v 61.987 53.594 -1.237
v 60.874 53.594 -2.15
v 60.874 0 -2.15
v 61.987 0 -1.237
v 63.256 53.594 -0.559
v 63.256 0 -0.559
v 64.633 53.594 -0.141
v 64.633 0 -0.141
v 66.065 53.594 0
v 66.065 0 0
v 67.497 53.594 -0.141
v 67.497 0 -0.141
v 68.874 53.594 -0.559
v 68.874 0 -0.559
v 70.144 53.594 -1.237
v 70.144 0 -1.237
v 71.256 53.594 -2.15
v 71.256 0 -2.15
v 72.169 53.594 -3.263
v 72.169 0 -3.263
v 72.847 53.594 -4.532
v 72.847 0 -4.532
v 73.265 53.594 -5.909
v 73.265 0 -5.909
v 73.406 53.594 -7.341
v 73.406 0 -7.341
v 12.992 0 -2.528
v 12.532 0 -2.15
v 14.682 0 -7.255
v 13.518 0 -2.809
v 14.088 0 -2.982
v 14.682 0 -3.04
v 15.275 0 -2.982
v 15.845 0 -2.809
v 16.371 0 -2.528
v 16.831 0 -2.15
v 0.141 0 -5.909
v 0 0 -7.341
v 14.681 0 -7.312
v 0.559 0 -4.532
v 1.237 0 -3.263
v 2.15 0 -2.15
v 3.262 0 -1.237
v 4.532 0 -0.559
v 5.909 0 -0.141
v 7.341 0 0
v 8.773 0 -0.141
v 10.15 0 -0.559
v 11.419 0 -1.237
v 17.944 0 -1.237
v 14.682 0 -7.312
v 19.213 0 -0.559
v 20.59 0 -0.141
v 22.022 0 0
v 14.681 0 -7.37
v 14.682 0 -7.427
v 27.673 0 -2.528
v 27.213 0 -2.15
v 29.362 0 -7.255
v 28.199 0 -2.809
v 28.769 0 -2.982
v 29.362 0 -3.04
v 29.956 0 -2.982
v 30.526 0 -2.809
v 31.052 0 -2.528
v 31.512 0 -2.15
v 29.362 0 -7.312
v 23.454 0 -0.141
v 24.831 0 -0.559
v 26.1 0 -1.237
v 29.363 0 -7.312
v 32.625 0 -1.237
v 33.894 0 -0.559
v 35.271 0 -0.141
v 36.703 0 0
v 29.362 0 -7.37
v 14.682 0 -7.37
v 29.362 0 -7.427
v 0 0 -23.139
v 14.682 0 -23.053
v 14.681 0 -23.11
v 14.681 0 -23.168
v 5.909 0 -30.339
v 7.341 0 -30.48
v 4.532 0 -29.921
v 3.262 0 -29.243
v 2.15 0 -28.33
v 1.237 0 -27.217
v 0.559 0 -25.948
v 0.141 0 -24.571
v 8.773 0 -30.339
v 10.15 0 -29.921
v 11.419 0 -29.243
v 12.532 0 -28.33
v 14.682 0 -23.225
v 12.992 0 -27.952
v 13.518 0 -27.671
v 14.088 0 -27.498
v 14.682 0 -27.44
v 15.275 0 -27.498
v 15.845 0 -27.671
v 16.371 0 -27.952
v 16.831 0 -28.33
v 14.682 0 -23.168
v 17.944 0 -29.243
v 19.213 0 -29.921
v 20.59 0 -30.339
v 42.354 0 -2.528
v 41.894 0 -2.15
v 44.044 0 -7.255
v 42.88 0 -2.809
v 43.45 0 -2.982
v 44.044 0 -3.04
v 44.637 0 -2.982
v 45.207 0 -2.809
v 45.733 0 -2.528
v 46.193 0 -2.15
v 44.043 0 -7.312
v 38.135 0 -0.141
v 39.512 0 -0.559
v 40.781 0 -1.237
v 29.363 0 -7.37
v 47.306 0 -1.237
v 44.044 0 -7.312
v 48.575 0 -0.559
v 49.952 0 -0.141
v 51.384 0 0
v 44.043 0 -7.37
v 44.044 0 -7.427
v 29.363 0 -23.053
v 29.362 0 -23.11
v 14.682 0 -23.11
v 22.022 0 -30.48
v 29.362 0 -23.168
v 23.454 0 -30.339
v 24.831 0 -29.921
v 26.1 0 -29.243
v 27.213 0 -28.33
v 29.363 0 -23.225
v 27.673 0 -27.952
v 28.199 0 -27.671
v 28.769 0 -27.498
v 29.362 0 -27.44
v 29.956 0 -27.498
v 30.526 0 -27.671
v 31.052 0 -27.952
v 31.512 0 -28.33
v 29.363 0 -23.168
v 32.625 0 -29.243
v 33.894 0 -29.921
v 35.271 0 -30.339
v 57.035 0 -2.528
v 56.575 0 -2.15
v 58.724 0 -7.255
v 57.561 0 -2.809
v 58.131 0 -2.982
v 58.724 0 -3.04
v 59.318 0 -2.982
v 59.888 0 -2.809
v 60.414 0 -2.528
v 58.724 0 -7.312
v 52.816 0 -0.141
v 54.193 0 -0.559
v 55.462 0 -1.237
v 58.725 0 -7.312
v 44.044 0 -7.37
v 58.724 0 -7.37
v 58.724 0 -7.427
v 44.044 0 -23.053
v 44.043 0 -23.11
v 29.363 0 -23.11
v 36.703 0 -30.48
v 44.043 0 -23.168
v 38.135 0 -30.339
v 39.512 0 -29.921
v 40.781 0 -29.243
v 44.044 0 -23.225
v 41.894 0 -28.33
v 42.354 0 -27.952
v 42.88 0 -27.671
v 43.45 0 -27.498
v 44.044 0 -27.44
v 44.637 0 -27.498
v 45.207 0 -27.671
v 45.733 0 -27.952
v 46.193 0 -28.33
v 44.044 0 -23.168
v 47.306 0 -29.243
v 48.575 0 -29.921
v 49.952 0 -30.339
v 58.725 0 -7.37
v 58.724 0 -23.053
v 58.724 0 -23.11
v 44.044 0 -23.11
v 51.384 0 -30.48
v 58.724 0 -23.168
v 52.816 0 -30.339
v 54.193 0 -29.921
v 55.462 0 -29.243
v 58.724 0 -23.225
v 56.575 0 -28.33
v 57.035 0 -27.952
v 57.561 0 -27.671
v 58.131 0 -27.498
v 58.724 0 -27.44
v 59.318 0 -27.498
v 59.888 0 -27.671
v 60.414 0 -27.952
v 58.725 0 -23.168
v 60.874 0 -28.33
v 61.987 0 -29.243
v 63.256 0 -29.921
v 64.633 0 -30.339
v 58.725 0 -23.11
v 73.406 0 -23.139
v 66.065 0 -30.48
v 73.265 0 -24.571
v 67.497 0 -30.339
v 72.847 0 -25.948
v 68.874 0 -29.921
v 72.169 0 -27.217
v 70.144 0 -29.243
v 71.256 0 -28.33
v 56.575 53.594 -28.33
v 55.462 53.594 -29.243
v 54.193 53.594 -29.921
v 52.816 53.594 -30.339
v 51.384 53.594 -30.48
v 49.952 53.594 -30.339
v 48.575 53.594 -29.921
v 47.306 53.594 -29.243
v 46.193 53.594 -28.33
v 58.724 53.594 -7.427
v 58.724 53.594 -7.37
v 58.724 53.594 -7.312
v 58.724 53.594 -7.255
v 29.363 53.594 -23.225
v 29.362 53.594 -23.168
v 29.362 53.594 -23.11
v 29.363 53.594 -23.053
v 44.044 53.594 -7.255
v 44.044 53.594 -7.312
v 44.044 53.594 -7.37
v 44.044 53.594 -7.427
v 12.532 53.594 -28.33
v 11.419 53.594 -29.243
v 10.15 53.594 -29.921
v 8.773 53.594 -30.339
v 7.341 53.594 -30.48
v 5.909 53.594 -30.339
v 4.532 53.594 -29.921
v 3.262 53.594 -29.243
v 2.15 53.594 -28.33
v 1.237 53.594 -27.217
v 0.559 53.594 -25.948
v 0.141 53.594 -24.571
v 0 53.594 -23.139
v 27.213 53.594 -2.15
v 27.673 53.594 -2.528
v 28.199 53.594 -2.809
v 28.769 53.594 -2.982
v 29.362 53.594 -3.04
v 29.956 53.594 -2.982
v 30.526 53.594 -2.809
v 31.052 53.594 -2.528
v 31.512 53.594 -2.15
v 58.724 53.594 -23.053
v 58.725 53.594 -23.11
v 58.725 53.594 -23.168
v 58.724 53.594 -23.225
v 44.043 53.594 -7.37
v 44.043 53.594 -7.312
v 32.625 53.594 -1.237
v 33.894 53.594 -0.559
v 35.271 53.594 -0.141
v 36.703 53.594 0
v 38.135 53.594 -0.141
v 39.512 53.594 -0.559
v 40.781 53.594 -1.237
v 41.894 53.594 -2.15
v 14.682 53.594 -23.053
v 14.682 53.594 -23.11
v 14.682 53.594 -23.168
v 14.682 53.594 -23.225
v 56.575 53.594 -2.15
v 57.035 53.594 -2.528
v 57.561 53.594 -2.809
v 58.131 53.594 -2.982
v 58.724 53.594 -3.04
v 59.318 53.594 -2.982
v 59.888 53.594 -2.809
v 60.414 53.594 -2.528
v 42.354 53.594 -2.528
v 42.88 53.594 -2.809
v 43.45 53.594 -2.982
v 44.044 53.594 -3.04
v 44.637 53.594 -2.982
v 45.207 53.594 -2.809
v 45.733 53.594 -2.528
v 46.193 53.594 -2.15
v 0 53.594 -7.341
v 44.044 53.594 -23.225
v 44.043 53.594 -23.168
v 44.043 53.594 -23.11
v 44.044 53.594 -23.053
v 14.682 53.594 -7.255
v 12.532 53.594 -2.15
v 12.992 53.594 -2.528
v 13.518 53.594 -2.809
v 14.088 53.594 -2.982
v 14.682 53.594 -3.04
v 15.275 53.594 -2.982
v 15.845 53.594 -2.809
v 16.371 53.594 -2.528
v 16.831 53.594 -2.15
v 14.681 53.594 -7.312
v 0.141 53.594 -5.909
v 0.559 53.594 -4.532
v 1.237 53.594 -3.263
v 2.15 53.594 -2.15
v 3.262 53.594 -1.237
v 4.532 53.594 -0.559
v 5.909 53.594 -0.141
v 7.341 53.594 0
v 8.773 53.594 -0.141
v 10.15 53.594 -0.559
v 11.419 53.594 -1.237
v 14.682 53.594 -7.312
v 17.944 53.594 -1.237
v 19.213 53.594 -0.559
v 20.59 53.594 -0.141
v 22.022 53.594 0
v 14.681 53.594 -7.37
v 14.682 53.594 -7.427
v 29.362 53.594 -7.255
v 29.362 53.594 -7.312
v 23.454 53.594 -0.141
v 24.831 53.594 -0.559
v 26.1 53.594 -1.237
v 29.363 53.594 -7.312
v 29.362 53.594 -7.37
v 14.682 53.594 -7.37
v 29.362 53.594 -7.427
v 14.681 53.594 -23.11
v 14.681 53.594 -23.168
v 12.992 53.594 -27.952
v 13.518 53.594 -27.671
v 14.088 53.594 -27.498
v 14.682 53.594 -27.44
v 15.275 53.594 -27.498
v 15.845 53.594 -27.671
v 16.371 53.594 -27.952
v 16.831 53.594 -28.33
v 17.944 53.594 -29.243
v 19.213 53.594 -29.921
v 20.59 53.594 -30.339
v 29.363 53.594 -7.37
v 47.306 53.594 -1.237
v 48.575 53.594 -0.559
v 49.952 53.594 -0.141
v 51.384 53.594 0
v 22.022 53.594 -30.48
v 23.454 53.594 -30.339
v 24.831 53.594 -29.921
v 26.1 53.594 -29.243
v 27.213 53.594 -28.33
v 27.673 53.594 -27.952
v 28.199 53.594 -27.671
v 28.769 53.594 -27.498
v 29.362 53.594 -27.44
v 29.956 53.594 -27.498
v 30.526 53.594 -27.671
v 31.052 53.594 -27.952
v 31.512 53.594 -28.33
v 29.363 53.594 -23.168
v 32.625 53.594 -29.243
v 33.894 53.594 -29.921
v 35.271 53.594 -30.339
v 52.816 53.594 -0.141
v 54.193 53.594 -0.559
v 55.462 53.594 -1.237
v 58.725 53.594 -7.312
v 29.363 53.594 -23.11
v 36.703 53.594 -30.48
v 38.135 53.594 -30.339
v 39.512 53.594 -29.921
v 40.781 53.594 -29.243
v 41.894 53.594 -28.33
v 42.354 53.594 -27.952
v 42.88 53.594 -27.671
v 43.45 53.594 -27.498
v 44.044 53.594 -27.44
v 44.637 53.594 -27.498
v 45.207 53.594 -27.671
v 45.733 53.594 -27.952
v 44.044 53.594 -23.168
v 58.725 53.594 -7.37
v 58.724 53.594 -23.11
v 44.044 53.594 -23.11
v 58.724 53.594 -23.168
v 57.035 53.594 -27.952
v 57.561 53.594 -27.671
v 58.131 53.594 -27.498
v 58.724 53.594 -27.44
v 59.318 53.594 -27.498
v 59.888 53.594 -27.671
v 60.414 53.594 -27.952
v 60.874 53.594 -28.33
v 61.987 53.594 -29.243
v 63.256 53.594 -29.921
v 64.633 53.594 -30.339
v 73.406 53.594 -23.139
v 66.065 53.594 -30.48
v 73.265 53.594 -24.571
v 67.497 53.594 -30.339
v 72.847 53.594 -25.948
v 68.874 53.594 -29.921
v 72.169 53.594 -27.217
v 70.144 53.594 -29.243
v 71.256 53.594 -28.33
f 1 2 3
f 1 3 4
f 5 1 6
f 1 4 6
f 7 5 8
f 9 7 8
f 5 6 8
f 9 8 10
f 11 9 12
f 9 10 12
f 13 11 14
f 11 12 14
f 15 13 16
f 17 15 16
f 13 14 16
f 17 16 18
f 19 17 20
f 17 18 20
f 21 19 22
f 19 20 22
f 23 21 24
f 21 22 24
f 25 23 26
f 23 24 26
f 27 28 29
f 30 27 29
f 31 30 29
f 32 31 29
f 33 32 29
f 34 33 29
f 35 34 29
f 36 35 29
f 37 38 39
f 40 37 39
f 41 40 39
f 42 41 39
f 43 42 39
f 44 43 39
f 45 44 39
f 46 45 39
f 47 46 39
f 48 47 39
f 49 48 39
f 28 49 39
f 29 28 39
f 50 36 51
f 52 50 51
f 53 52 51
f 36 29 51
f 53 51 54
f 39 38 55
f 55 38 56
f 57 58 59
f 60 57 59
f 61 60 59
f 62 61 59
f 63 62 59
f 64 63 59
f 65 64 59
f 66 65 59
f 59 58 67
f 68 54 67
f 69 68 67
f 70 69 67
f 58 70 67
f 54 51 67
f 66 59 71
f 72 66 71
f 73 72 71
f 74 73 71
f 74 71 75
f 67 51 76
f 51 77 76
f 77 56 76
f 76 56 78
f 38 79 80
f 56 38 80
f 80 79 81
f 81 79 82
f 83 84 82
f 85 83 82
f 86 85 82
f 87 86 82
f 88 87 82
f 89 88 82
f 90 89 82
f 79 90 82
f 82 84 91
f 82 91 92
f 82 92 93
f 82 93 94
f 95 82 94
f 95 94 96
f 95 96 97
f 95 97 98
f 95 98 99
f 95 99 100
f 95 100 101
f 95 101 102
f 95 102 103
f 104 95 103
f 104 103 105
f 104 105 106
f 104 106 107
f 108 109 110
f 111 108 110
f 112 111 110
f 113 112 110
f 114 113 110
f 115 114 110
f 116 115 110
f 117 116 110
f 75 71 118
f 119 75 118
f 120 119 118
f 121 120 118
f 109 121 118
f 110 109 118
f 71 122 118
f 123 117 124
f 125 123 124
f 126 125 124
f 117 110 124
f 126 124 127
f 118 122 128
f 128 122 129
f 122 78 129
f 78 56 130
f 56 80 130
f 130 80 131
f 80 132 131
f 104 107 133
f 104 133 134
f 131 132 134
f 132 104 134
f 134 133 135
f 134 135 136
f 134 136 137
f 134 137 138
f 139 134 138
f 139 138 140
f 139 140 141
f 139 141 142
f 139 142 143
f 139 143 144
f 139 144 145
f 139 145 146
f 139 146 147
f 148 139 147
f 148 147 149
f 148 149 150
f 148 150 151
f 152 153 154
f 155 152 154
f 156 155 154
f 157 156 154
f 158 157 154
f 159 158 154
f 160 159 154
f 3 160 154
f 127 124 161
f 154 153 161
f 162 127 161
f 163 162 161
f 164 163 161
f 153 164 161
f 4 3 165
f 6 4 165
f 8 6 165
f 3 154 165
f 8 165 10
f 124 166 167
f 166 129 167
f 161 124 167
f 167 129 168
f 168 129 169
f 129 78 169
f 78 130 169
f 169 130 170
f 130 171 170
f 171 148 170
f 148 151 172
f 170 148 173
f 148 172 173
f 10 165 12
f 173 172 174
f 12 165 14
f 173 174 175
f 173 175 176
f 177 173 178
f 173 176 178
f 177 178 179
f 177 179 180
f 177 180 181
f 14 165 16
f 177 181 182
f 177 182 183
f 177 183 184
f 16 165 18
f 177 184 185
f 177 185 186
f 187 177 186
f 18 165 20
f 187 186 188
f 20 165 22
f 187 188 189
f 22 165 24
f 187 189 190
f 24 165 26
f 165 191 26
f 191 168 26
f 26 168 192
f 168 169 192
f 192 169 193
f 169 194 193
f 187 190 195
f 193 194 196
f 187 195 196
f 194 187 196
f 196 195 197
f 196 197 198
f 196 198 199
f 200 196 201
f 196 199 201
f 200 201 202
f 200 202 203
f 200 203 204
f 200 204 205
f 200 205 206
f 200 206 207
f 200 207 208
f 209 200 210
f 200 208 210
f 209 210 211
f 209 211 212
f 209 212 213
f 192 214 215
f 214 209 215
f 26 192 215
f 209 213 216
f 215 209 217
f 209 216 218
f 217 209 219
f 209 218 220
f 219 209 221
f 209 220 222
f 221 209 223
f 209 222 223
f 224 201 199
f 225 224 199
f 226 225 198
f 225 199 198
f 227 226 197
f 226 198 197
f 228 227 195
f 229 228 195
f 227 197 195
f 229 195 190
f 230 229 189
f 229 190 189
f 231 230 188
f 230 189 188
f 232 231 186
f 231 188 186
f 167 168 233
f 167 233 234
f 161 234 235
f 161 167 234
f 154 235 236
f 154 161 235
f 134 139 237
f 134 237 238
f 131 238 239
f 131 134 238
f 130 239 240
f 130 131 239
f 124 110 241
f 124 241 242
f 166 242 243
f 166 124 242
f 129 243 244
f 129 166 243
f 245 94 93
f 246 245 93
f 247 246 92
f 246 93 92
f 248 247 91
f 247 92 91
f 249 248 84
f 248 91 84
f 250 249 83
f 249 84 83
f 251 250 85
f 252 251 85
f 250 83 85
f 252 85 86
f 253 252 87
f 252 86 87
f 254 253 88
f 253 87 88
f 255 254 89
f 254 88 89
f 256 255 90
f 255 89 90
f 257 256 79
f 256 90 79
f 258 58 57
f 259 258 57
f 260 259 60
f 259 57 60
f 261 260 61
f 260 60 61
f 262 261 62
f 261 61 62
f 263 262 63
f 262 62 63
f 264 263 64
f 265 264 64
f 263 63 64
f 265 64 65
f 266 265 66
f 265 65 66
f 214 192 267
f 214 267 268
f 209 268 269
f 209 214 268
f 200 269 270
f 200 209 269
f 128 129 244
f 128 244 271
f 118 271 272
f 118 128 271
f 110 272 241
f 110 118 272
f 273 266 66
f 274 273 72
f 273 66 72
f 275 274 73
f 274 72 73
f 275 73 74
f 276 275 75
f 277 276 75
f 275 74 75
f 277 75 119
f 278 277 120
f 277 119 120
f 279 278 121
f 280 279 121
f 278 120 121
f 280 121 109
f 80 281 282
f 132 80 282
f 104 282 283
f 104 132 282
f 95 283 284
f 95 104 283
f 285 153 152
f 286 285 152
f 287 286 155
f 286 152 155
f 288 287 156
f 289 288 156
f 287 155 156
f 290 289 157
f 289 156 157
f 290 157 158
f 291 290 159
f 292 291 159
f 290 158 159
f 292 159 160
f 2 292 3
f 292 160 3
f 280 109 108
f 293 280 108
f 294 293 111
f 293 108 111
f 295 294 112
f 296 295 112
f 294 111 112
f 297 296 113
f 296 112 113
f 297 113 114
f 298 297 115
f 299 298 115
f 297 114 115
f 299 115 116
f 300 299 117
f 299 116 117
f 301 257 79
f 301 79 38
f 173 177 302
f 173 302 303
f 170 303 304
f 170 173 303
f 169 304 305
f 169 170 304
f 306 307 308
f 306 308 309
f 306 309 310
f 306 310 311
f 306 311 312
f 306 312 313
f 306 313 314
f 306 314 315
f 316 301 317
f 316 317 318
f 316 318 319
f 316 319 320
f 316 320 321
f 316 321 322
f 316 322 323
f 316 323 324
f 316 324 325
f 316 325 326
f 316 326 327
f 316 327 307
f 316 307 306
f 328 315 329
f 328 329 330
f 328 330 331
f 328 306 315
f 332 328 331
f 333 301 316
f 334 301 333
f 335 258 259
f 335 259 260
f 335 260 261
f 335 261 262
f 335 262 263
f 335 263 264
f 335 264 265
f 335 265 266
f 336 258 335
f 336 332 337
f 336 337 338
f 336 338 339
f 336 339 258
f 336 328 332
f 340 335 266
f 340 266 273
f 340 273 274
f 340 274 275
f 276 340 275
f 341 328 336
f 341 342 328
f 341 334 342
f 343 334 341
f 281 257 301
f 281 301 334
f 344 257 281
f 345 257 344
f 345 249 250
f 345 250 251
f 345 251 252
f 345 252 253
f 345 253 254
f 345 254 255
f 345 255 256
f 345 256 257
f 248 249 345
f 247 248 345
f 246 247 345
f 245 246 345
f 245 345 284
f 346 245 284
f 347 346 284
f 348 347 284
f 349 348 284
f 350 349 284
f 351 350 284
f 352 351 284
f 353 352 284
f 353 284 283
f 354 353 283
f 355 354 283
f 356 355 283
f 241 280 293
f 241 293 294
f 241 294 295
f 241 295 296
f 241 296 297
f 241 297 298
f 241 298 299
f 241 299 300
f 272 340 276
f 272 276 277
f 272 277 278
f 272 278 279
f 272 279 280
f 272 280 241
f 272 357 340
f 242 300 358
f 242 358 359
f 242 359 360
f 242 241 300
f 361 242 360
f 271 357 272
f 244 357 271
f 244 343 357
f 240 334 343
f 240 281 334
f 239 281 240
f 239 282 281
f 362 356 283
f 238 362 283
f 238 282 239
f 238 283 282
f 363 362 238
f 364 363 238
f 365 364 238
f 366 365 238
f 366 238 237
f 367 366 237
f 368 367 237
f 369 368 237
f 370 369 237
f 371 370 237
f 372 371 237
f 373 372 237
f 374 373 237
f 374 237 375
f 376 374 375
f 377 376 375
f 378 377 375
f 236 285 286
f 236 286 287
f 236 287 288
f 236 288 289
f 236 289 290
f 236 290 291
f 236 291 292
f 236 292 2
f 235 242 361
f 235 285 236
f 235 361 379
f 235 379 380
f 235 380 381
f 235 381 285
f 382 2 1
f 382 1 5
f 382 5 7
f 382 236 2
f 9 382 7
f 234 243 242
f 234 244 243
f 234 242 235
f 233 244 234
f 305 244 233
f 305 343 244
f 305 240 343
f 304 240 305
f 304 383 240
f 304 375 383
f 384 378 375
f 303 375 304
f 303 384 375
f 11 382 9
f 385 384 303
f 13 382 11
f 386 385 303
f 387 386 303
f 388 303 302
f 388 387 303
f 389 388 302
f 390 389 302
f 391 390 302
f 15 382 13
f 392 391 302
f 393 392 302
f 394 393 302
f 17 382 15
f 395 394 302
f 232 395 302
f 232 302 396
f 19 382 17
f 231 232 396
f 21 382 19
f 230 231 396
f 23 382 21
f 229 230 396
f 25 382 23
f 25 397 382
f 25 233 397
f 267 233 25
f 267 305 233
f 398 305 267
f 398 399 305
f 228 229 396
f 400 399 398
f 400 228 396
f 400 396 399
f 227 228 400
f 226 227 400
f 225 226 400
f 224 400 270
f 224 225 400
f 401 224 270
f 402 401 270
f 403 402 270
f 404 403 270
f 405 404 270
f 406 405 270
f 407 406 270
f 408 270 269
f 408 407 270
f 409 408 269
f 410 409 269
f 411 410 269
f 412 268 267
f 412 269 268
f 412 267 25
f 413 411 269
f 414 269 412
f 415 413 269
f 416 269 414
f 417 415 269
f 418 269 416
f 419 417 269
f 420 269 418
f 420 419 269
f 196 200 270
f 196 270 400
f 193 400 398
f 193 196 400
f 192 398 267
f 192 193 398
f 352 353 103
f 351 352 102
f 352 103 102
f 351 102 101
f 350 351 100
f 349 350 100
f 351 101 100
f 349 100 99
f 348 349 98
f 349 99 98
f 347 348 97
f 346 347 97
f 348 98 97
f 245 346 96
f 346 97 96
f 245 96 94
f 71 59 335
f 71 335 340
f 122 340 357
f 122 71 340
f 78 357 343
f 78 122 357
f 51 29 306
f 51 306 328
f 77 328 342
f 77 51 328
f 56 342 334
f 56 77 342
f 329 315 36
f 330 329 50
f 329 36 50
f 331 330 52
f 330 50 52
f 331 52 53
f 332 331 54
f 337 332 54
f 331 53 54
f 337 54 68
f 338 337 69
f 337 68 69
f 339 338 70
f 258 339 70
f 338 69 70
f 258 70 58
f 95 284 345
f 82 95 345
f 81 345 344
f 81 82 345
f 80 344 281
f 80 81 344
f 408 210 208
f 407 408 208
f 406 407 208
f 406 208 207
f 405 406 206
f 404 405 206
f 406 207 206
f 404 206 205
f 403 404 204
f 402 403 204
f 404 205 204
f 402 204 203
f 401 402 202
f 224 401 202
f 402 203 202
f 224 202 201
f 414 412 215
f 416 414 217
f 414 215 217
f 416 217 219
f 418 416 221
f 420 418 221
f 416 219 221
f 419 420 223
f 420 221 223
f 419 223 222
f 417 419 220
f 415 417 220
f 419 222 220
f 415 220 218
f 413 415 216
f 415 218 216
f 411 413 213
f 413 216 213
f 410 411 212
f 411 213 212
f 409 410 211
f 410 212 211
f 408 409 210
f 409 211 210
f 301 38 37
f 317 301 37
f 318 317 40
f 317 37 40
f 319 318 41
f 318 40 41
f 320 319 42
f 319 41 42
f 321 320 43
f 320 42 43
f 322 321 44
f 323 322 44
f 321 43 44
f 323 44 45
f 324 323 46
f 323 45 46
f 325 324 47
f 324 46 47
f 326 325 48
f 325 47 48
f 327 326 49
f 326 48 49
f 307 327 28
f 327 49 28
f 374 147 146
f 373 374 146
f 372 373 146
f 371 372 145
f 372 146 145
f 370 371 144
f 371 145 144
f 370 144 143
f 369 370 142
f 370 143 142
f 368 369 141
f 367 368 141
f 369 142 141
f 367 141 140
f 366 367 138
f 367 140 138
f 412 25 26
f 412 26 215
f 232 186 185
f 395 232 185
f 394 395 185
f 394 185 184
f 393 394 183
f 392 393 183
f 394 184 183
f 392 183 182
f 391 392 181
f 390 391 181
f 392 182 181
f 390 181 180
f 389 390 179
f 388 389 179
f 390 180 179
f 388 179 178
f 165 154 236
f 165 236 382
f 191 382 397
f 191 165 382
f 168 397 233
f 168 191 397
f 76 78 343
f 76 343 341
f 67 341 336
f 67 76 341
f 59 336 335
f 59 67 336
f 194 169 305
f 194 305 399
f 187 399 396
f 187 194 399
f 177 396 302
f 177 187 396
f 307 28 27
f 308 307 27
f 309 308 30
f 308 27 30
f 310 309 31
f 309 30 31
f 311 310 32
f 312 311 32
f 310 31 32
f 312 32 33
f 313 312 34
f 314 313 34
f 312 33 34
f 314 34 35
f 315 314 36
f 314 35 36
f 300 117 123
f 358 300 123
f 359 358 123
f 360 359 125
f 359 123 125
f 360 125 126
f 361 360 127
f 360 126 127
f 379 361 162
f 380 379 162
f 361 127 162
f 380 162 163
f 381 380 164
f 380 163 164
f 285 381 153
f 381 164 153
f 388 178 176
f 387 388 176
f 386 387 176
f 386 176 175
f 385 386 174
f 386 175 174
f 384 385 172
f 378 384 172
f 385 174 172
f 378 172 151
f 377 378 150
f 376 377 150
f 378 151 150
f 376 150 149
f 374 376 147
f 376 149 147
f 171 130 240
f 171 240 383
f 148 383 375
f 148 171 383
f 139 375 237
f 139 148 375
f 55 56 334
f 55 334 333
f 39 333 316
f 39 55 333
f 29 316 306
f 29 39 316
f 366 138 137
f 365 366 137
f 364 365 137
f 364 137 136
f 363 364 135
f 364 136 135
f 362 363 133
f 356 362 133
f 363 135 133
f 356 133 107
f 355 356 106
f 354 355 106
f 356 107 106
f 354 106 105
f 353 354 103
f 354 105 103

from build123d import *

# Parameters (mm, degrees)
BOSS_EXTRUDE1_DEPTH = 53.594


with BuildPart() as part:
    # Sketch1 → Boss-Extrude1 (new body)
    with BuildSketch(Plane(origin=(0, 0, 0), x_dir=(1, 0, 0), z_dir=(0, 1, 0))):
        with BuildLine():
            Line((0, 23.139), (0, 7.341))
            ThreePointArc((0, 7.341), (4.531605435, 0.55884819), (12.531694095, 2.14995234))
            ThreePointArc((12.531694095, 2.14995234), (14.6815, 3.040388214), (16.831305905, 2.14995234))
            ThreePointArc((16.831305905, 2.14995234), (22.022, 0), (27.212694095, 2.14995234))
            ThreePointArc((27.212694095, 2.14995234), (29.3625, 3.040388214), (31.512305905, 2.14995234))
            ThreePointArc((31.512305905, 2.14995234), (36.703, 0), (41.893694095, 2.14995234))
            ThreePointArc((41.893694095, 2.14995234), (44.0435, 3.040388214), (46.193305905, 2.14995234))
            ThreePointArc((46.193305905, 2.14995234), (51.384, 0), (56.574694095, 2.14995234))
            ThreePointArc((56.574694095, 2.14995234), (58.7245, 3.040388214), (60.874305905, 2.14995234))
            ThreePointArc((60.874305905, 2.14995234), (68.874394565, 0.55884819), (73.406, 7.341))
            Line((73.406, 7.341), (73.406, 23.139))
            ThreePointArc((73.406, 23.139), (68.874394565, 29.92115181), (60.874305905, 28.33004766))
            ThreePointArc((60.874305905, 28.33004766), (58.7245, 27.439611786), (56.574694095, 28.33004766))
            ThreePointArc((56.574694095, 28.33004766), (51.384, 30.48), (46.193305905, 28.33004766))
            ThreePointArc((46.193305905, 28.33004766), (44.0435, 27.439611786), (41.893694095, 28.33004766))
            ThreePointArc((41.893694095, 28.33004766), (36.703, 30.48), (31.512305905, 28.33004766))
            ThreePointArc((31.512305905, 28.33004766), (29.3625, 27.439611786), (27.212694095, 28.33004766))
            ThreePointArc((27.212694095, 28.33004766), (22.022, 30.48), (16.831305905, 28.33004766))
            ThreePointArc((16.831305905, 28.33004766), (14.6815, 27.439611786), (12.531694095, 28.33004766))
            ThreePointArc((12.531694095, 28.33004766), (4.531605435, 29.92115181), (0, 23.139))
        make_face()
        with BuildLine():
            ThreePointArc((14.6815, 23.053321823), (14.682, 23.139), (14.6815, 23.224678177))
            ThreePointArc((14.6815, 23.224678177), (14.681, 23.139), (14.6815, 23.053321823))
        make_face(mode=Mode.SUBTRACT)
        with BuildLine():
            ThreePointArc((29.3625, 23.053321823), (29.363, 23.139), (29.3625, 23.224678177))
            ThreePointArc((29.3625, 23.224678177), (29.362, 23.139), (29.3625, 23.053321823))
        make_face(mode=Mode.SUBTRACT)
        with BuildLine():
            ThreePointArc((14.6815, 7.426678177), (14.681, 7.341), (14.6815, 7.255321823))
            ThreePointArc((14.6815, 7.255321823), (14.682, 7.341), (14.6815, 7.426678177))
        make_face(mode=Mode.SUBTRACT)
        with BuildLine():
            ThreePointArc((44.0435, 23.053321823), (44.044, 23.139), (44.0435, 23.224678177))
            ThreePointArc((44.0435, 23.224678177), (44.043, 23.139), (44.0435, 23.053321823))
        make_face(mode=Mode.SUBTRACT)
        with BuildLine():
            ThreePointArc((29.3625, 7.426678177), (29.362, 7.341), (29.3625, 7.255321823))
            ThreePointArc((29.3625, 7.255321823), (29.363, 7.341), (29.3625, 7.426678177))
        make_face(mode=Mode.SUBTRACT)
        with BuildLine():
            ThreePointArc((58.7245, 23.053321823), (58.725, 23.139), (58.7245, 23.224678177))
            ThreePointArc((58.7245, 23.224678177), (58.724, 23.139), (58.7245, 23.053321823))
        make_face(mode=Mode.SUBTRACT)
        with BuildLine():
            ThreePointArc((44.0435, 7.426678177), (44.043, 7.341), (44.0435, 7.255321823))
            ThreePointArc((44.0435, 7.255321823), (44.044, 7.341), (44.0435, 7.426678177))
        make_face(mode=Mode.SUBTRACT)
        with BuildLine():
            ThreePointArc((58.7245, 7.426678177), (58.724, 7.341), (58.7245, 7.255321823))
            ThreePointArc((58.7245, 7.255321823), (58.725, 7.341), (58.7245, 7.426678177))
        make_face(mode=Mode.SUBTRACT)
    extrude(amount=BOSS_EXTRUDE1_DEPTH)


solid = part.part
